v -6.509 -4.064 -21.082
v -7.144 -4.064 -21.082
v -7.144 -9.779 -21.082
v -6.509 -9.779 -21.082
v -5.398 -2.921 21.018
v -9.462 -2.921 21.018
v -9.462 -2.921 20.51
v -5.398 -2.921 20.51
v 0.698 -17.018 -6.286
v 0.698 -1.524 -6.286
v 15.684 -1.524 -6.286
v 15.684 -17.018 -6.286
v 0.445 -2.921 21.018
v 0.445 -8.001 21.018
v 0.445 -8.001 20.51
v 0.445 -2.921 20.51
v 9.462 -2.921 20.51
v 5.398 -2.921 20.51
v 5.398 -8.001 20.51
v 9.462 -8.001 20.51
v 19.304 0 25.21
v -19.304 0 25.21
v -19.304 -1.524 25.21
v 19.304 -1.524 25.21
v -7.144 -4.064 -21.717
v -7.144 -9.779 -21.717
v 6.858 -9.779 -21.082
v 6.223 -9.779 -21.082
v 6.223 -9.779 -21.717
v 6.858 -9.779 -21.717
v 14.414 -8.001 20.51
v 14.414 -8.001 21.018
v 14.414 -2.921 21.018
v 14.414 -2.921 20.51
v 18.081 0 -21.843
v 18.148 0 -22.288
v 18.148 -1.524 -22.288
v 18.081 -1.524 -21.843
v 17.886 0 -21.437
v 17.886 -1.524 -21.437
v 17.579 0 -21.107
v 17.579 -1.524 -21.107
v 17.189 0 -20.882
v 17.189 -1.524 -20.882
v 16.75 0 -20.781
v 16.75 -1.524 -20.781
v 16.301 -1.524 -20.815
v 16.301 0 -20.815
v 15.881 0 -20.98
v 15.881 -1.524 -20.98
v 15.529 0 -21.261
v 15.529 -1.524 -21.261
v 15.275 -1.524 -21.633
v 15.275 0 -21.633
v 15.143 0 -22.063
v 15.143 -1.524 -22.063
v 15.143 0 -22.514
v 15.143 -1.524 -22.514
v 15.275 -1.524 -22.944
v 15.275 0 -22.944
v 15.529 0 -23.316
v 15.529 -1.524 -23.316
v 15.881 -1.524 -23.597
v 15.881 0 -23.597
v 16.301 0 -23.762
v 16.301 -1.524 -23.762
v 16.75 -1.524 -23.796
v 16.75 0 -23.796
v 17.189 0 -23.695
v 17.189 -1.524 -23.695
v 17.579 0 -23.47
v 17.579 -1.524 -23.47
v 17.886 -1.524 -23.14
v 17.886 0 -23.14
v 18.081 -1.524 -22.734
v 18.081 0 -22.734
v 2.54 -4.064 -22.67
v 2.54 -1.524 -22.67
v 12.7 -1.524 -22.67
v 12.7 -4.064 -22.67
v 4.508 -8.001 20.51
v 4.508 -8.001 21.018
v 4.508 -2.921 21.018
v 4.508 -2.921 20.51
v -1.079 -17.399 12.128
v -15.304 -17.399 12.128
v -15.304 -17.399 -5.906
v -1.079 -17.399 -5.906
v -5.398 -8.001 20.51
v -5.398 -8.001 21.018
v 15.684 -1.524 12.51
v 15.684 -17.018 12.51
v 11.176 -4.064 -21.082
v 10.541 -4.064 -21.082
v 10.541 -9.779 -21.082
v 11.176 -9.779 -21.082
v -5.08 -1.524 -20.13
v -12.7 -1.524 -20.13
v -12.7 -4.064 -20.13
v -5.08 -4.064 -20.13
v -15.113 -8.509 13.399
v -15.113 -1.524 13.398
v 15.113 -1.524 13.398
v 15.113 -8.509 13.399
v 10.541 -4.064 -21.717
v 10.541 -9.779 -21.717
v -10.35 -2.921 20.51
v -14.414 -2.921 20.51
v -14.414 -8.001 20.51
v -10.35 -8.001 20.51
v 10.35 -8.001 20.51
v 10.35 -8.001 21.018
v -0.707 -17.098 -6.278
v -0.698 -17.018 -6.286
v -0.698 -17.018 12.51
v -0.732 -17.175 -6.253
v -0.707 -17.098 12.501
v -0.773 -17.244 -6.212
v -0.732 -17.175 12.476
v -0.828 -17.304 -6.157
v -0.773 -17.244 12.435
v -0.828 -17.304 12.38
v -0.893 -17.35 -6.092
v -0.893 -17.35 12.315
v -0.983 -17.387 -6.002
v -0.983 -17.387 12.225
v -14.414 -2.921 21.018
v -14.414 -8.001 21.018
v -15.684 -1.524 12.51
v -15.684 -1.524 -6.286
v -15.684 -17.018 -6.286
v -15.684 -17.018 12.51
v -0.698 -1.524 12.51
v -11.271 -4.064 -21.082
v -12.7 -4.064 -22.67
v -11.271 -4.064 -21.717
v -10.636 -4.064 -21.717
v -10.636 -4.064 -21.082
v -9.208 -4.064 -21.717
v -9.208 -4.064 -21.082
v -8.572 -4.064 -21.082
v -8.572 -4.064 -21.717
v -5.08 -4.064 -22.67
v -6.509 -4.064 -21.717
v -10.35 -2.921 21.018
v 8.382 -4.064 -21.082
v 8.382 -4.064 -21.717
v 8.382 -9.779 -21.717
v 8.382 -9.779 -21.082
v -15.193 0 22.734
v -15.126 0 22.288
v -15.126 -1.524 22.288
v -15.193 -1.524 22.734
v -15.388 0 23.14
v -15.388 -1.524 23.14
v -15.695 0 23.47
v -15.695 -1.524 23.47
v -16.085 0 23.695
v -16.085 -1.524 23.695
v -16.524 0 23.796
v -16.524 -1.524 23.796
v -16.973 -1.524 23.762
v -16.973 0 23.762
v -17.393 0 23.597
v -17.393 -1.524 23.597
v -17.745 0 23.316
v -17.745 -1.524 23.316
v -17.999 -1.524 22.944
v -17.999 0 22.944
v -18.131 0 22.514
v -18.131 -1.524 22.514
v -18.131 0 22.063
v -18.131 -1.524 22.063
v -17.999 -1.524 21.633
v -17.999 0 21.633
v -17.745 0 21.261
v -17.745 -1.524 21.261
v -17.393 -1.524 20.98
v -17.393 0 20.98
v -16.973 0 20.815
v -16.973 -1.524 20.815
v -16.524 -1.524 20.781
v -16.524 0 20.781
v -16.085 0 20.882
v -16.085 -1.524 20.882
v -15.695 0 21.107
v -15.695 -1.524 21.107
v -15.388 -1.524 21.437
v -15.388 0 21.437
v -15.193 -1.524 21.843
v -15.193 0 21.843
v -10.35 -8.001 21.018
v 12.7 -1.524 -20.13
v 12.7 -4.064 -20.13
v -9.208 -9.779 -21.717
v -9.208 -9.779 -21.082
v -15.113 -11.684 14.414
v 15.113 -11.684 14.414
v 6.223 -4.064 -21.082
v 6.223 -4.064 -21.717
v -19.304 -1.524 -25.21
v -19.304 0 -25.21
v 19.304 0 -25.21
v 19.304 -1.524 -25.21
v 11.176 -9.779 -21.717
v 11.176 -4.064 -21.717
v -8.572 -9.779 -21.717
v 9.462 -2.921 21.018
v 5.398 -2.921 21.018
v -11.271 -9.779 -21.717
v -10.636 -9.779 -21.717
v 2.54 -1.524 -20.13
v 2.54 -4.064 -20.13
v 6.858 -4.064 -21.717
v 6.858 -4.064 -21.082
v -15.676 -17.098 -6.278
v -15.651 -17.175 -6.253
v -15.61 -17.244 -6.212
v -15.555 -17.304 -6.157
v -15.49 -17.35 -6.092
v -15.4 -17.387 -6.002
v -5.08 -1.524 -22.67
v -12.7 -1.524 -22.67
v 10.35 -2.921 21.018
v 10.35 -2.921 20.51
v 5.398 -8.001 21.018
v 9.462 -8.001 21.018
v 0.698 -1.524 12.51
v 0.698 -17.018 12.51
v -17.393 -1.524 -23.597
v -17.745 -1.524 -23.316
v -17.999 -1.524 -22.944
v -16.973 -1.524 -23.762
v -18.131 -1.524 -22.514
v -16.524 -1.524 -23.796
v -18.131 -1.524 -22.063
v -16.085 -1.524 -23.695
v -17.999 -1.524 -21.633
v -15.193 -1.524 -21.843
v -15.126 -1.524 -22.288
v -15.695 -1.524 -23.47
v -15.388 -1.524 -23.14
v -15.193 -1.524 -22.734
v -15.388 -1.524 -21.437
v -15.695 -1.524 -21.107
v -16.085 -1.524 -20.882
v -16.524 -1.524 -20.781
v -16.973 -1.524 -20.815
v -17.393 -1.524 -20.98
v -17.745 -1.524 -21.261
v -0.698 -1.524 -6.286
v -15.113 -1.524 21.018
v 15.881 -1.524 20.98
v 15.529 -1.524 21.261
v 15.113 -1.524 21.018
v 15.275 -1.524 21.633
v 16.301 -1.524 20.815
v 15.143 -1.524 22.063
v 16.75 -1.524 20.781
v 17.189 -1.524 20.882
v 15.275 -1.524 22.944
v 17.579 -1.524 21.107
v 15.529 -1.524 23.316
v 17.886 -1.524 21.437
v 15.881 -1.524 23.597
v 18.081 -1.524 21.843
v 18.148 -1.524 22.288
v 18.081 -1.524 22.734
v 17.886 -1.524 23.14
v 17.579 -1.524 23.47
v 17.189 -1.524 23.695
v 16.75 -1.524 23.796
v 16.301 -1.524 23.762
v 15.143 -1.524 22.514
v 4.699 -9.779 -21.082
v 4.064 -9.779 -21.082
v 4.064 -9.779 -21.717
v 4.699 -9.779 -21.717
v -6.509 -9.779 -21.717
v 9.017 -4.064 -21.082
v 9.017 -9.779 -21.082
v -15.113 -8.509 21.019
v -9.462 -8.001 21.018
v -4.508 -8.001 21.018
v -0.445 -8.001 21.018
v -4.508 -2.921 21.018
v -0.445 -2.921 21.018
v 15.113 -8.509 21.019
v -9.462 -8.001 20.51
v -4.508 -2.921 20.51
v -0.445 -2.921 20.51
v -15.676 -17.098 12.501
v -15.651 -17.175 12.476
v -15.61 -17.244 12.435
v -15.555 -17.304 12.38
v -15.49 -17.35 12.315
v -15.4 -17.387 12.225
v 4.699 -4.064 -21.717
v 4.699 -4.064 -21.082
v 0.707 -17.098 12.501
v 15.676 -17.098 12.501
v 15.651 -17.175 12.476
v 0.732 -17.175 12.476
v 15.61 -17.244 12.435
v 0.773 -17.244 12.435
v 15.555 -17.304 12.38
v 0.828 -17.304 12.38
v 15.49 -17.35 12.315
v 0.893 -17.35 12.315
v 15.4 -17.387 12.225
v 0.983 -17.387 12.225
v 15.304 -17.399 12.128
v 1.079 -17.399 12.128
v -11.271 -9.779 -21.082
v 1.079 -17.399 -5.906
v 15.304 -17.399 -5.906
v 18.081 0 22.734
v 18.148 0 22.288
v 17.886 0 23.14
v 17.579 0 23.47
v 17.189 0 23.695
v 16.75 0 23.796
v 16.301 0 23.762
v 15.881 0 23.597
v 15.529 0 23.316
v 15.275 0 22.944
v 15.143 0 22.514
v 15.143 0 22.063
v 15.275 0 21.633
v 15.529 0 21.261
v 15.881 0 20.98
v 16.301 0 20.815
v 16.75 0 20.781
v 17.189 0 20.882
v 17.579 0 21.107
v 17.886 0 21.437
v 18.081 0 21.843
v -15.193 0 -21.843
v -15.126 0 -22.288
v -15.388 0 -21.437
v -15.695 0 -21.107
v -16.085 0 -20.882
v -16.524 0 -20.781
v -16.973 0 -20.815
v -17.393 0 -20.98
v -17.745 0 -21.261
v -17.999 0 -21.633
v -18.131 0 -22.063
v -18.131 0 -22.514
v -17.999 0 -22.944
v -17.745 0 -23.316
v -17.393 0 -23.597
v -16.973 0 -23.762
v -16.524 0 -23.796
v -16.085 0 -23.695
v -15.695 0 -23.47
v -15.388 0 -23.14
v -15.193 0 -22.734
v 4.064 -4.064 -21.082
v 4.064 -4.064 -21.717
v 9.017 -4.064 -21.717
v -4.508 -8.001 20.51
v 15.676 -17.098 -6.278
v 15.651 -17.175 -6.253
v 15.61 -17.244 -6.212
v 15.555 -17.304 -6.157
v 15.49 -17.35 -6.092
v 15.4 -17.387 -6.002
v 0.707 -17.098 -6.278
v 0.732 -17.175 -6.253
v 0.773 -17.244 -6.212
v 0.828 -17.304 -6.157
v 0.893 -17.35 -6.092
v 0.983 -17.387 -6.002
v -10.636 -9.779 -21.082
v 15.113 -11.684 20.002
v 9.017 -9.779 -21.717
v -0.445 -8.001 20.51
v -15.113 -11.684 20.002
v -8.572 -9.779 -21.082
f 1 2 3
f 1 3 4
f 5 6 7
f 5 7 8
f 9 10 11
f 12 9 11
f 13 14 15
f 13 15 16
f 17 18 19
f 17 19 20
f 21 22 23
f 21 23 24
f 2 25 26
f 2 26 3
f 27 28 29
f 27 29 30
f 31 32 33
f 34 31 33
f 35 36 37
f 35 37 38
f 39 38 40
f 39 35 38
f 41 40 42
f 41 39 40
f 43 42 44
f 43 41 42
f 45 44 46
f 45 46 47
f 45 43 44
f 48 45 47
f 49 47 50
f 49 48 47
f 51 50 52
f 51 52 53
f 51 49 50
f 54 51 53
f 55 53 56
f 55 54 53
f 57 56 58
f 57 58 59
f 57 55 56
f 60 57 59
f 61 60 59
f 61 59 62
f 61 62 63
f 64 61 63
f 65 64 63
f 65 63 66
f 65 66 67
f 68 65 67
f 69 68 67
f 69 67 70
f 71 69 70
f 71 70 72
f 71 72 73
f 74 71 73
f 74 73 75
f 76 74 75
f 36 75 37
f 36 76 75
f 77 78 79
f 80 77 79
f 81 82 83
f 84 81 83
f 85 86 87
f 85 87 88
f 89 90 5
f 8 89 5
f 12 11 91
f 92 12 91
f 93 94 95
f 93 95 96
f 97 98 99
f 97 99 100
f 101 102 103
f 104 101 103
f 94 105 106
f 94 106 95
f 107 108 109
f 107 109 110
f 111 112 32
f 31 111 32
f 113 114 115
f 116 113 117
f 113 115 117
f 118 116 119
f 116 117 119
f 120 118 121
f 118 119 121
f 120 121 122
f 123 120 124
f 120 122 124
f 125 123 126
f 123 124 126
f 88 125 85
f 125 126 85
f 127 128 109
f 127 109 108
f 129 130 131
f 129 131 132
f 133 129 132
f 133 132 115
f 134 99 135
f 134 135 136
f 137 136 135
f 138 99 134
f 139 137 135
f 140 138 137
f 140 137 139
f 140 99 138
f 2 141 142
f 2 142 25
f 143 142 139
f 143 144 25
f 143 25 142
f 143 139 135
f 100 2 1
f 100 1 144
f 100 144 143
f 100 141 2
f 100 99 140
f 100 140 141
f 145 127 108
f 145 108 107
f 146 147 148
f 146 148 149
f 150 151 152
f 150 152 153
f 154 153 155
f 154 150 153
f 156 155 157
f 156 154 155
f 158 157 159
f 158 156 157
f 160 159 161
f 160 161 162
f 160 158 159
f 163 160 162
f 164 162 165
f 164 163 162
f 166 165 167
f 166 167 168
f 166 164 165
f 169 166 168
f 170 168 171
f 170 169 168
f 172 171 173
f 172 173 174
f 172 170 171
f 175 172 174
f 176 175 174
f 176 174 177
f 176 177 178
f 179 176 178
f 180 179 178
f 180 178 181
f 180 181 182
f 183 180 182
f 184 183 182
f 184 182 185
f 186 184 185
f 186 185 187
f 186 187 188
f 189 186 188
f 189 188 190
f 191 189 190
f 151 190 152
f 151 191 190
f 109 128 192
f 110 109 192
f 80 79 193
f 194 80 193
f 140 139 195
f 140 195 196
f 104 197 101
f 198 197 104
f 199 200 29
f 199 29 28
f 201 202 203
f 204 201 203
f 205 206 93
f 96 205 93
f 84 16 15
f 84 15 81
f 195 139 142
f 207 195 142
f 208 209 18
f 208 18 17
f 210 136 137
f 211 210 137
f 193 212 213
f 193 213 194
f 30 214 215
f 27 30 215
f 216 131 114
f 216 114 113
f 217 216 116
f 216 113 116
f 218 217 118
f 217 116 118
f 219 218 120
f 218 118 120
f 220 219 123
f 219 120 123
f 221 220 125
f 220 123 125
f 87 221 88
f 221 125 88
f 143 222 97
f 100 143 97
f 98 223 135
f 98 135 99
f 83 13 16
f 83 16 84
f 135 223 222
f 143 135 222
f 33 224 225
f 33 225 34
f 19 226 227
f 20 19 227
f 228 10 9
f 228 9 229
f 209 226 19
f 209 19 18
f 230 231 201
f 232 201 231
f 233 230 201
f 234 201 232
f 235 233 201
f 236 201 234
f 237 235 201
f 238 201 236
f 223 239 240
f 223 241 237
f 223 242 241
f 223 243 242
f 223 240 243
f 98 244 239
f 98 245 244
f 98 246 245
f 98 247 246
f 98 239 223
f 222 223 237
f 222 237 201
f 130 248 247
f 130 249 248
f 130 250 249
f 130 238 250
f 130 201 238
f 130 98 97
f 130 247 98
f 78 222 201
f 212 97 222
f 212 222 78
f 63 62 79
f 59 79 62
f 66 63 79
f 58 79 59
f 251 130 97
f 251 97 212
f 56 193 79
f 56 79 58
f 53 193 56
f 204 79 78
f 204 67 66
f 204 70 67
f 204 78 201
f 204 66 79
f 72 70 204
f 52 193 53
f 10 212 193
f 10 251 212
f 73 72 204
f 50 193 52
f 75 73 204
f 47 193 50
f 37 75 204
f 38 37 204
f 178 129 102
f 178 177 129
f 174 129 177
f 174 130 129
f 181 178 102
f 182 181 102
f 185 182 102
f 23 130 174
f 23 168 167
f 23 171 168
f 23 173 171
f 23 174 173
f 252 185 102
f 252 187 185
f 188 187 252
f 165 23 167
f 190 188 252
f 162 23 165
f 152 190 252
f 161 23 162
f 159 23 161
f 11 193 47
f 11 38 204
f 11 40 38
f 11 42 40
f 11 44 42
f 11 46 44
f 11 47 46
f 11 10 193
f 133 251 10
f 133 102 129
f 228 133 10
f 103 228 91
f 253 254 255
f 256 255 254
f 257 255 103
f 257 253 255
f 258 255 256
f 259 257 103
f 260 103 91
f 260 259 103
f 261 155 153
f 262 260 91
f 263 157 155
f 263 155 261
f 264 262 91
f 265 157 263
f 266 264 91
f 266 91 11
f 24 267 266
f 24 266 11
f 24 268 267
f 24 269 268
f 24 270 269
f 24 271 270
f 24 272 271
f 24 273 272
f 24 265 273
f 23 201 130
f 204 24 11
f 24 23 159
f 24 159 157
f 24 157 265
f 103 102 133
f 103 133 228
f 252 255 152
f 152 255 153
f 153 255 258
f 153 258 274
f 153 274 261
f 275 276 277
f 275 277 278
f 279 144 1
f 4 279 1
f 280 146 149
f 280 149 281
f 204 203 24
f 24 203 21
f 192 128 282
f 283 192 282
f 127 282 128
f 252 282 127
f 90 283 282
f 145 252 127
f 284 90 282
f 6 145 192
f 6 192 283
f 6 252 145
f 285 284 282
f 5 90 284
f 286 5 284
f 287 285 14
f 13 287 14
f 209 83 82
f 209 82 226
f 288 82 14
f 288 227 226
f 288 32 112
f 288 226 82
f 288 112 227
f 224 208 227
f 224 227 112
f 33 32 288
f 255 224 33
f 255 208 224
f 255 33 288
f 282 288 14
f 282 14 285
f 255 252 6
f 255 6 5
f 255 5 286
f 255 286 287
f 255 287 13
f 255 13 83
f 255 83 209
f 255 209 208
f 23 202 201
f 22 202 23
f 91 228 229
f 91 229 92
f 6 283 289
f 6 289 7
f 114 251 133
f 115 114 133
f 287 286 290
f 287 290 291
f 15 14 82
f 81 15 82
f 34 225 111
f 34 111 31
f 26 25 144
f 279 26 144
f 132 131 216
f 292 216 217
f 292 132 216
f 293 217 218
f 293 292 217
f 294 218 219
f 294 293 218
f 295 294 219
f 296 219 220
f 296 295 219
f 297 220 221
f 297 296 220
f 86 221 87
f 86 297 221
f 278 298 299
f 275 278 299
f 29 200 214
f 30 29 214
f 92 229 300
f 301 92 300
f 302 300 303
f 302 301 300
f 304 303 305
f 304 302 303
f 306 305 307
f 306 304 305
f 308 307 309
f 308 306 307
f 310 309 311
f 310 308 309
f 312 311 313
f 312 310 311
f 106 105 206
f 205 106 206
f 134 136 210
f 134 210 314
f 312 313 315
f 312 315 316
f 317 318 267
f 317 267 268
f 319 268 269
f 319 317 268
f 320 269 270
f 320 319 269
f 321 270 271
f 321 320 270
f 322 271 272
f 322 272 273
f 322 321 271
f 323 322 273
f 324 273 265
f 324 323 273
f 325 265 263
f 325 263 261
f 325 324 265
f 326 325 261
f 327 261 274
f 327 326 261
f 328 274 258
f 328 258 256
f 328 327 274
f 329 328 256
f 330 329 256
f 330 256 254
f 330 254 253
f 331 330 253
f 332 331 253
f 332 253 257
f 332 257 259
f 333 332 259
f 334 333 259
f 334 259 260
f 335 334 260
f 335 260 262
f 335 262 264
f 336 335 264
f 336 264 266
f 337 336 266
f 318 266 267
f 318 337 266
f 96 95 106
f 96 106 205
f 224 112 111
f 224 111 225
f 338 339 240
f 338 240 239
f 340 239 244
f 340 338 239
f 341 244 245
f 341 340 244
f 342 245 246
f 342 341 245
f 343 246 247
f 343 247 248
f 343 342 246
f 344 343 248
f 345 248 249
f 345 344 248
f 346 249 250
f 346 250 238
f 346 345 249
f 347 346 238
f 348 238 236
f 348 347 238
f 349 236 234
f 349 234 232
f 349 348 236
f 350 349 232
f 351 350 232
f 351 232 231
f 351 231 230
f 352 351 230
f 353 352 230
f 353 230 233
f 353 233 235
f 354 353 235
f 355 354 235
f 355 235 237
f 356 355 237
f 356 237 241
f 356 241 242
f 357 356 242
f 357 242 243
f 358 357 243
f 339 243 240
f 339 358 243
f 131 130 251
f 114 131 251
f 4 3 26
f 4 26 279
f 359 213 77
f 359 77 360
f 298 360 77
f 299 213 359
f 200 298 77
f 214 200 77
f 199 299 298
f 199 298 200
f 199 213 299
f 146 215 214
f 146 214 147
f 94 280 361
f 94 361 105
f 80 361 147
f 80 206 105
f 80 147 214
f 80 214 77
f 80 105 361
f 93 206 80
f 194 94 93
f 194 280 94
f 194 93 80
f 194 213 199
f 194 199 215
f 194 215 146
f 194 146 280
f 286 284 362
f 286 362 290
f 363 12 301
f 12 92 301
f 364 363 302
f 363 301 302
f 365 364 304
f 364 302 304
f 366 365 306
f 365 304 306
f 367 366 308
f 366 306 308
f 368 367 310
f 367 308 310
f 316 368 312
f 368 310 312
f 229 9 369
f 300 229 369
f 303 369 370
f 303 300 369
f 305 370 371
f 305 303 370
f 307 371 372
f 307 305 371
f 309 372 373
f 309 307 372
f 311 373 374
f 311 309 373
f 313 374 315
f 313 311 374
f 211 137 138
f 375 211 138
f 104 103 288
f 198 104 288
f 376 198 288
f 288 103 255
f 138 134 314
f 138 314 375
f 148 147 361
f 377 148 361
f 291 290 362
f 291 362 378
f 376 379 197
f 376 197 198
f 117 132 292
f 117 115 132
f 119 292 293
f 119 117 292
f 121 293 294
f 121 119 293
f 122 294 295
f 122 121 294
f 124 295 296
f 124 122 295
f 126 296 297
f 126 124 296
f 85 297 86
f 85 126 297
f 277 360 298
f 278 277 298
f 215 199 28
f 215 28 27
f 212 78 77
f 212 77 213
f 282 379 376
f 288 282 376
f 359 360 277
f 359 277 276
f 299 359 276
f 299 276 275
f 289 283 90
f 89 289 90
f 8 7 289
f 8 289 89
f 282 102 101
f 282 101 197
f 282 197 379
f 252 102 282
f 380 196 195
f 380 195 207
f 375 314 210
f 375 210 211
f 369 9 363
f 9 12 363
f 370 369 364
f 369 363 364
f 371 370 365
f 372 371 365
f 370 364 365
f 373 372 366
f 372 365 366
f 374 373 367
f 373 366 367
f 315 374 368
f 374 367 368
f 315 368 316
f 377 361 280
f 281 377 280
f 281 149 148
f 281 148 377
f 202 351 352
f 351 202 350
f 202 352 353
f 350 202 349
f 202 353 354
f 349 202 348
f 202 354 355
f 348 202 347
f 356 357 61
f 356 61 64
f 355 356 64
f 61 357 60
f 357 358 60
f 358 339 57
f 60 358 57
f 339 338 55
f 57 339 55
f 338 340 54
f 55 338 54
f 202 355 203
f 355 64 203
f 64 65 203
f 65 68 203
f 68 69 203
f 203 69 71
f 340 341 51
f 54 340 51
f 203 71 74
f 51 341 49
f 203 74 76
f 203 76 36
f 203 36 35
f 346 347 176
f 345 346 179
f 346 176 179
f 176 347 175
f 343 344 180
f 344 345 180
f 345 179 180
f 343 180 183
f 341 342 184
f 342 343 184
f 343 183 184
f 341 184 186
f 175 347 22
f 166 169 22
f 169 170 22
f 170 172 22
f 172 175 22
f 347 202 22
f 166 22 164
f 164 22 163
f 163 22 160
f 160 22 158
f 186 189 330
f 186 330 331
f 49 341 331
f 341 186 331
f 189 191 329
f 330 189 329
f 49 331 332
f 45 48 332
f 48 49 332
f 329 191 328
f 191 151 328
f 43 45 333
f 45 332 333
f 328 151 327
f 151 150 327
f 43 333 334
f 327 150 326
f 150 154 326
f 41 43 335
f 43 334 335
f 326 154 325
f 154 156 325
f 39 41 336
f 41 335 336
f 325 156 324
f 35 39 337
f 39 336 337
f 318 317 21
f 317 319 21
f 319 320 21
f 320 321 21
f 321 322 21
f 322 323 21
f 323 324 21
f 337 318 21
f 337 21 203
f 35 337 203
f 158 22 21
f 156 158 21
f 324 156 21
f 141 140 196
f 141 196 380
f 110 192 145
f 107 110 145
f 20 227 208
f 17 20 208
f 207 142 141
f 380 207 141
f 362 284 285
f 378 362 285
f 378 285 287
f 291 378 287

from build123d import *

# Parameters (mm, degrees)
F0_W      = 38.608
F0_H      = 50.419
F0_R      = 1.5113
F1_DEPTH  = 1.524
F2_W      = 14.986
F2_H      = 18.796
F3_DEPTH  = 15.875
F4_R      = 0.381
F5_W      = 30.226
F5_H      = 7.62
F6_DEPTH  = 10.16
F7_SIZE2  = 1.016
F7_SIZE   = 3.175
F8_W      = 4.064
F8_H      = 5.08
F9_DEPTH  = 0.508
F10_W     = 7.62
F10_H     = 2.54
F10_W_2   = 10.16
F11_DEPTH = 2.54
F12_W     = 0.635
F12_H     = 0.635
F13_DEPTH = 5.715


with BuildPart() as f1:
    # F0 (on Front) → F1 (new body)
    with BuildSketch(Plane.XZ):
        Rectangle(F0_W, F0_H)
        with Locations((-16.637, -22.2885)):
            Circle(F0_R, mode=Mode.SUBTRACT)
        with Locations((16.637, -22.2885)):
            Circle(F0_R, mode=Mode.SUBTRACT)
        with Locations((-16.637, 22.2885)):
            Circle(F0_R, mode=Mode.SUBTRACT)
        with Locations((16.637, 22.2885)):
            Circle(F0_R, mode=Mode.SUBTRACT)
    extrude(amount=F1_DEPTH)

    # F2 (on face) → F3 (join)
    with BuildSketch(Plane.XZ.offset(1.524)):
        with Locations((-8.1915, 3.1115)):
            Rectangle(F2_W, F2_H)
        with Locations((8.1915, 3.1115)):
            Rectangle(F2_W, F2_H)
    extrude(amount=F3_DEPTH)

    # F4
    f4_edges = [f1.edges().sort_by_distance(p)[0] for p in [
        (-8.1915, -17.399, 12.5095),
        (-15.6845, -17.399, 3.1115),
        (-8.1915, -17.399, -6.2865),
        (-0.6985, -17.399, 3.1115),
        (0.6985, -17.399, 3.1115),
        (8.1915, -17.399, -6.2865),
        (15.6845, -17.399, 3.1115),
        (8.1915, -17.399, 12.5095),
    ]]
    fillet(f4_edges, radius=F4_R)

    # F5 (on face) → F6 (join)
    with BuildSketch(Plane.XZ.offset(1.524)):
        with Locations((0, 17.2085)):
            Rectangle(F5_W, F5_H)
    extrude(amount=F6_DEPTH)

    # F7
    f7_edges = [f1.edges().sort_by_distance(p)[0] for p in [
        (0, -11.684, 21.0185),
        (0, -11.684, 13.3985),
    ]]
    chamfer(f7_edges, length=F7_SIZE, length2=F7_SIZE2)

    # F8 (on face) → F9 (cut)
    with BuildSketch(Plane.XY.offset(21.0185)):
        with Locations((-12.3825, -5.461)):
            Rectangle(F8_W, F8_H)
        with Locations((-7.4295, -5.461)):
            Rectangle(F8_W, F8_H)
        with Locations((-2.4765, -5.461)):
            Rectangle(F8_W, F8_H)
        with Locations((2.4765, -5.461)):
            Rectangle(F8_W, F8_H)
        with Locations((7.4295, -5.461)):
            Rectangle(F8_W, F8_H)
        with Locations((12.3825, -5.461)):
            Rectangle(F8_W, F8_H)
    extrude(amount=-F9_DEPTH, mode=Mode.SUBTRACT)

    # F10 (on face) → F11 (join)
    with BuildSketch(Plane.XZ.offset(1.524)):
        with Locations((-8.89, -21.3995)):
            Rectangle(F10_W, F10_H)
        with Locations((7.62, -21.3995)):
            Rectangle(F10_W_2, F10_H)
    extrude(amount=F11_DEPTH)

    # F12 (on face) → F13 (join)
    with BuildSketch(Plane.XZ.offset(4.064)):
        with Locations((4.3815, -21.3995)):
            Rectangle(F12_W, F12_H)
        with Locations((6.5405, -21.3995)):
            Rectangle(F12_W, F12_H)
        with Locations((8.6995, -21.3995)):
            Rectangle(F12_W, F12_H)
        with Locations((10.8585, -21.3995)):
            Rectangle(F12_W, F12_H)
        with Locations((-6.82625, -21.3995)):
            Rectangle(F12_W, F12_H)
        with Locations((-8.89, -21.3995)):
            Rectangle(F12_W, F12_H)
        with Locations((-10.95375, -21.3995)):
            Rectangle(F12_W, F12_H)
    extrude(amount=F13_DEPTH)


solid = f1.part
